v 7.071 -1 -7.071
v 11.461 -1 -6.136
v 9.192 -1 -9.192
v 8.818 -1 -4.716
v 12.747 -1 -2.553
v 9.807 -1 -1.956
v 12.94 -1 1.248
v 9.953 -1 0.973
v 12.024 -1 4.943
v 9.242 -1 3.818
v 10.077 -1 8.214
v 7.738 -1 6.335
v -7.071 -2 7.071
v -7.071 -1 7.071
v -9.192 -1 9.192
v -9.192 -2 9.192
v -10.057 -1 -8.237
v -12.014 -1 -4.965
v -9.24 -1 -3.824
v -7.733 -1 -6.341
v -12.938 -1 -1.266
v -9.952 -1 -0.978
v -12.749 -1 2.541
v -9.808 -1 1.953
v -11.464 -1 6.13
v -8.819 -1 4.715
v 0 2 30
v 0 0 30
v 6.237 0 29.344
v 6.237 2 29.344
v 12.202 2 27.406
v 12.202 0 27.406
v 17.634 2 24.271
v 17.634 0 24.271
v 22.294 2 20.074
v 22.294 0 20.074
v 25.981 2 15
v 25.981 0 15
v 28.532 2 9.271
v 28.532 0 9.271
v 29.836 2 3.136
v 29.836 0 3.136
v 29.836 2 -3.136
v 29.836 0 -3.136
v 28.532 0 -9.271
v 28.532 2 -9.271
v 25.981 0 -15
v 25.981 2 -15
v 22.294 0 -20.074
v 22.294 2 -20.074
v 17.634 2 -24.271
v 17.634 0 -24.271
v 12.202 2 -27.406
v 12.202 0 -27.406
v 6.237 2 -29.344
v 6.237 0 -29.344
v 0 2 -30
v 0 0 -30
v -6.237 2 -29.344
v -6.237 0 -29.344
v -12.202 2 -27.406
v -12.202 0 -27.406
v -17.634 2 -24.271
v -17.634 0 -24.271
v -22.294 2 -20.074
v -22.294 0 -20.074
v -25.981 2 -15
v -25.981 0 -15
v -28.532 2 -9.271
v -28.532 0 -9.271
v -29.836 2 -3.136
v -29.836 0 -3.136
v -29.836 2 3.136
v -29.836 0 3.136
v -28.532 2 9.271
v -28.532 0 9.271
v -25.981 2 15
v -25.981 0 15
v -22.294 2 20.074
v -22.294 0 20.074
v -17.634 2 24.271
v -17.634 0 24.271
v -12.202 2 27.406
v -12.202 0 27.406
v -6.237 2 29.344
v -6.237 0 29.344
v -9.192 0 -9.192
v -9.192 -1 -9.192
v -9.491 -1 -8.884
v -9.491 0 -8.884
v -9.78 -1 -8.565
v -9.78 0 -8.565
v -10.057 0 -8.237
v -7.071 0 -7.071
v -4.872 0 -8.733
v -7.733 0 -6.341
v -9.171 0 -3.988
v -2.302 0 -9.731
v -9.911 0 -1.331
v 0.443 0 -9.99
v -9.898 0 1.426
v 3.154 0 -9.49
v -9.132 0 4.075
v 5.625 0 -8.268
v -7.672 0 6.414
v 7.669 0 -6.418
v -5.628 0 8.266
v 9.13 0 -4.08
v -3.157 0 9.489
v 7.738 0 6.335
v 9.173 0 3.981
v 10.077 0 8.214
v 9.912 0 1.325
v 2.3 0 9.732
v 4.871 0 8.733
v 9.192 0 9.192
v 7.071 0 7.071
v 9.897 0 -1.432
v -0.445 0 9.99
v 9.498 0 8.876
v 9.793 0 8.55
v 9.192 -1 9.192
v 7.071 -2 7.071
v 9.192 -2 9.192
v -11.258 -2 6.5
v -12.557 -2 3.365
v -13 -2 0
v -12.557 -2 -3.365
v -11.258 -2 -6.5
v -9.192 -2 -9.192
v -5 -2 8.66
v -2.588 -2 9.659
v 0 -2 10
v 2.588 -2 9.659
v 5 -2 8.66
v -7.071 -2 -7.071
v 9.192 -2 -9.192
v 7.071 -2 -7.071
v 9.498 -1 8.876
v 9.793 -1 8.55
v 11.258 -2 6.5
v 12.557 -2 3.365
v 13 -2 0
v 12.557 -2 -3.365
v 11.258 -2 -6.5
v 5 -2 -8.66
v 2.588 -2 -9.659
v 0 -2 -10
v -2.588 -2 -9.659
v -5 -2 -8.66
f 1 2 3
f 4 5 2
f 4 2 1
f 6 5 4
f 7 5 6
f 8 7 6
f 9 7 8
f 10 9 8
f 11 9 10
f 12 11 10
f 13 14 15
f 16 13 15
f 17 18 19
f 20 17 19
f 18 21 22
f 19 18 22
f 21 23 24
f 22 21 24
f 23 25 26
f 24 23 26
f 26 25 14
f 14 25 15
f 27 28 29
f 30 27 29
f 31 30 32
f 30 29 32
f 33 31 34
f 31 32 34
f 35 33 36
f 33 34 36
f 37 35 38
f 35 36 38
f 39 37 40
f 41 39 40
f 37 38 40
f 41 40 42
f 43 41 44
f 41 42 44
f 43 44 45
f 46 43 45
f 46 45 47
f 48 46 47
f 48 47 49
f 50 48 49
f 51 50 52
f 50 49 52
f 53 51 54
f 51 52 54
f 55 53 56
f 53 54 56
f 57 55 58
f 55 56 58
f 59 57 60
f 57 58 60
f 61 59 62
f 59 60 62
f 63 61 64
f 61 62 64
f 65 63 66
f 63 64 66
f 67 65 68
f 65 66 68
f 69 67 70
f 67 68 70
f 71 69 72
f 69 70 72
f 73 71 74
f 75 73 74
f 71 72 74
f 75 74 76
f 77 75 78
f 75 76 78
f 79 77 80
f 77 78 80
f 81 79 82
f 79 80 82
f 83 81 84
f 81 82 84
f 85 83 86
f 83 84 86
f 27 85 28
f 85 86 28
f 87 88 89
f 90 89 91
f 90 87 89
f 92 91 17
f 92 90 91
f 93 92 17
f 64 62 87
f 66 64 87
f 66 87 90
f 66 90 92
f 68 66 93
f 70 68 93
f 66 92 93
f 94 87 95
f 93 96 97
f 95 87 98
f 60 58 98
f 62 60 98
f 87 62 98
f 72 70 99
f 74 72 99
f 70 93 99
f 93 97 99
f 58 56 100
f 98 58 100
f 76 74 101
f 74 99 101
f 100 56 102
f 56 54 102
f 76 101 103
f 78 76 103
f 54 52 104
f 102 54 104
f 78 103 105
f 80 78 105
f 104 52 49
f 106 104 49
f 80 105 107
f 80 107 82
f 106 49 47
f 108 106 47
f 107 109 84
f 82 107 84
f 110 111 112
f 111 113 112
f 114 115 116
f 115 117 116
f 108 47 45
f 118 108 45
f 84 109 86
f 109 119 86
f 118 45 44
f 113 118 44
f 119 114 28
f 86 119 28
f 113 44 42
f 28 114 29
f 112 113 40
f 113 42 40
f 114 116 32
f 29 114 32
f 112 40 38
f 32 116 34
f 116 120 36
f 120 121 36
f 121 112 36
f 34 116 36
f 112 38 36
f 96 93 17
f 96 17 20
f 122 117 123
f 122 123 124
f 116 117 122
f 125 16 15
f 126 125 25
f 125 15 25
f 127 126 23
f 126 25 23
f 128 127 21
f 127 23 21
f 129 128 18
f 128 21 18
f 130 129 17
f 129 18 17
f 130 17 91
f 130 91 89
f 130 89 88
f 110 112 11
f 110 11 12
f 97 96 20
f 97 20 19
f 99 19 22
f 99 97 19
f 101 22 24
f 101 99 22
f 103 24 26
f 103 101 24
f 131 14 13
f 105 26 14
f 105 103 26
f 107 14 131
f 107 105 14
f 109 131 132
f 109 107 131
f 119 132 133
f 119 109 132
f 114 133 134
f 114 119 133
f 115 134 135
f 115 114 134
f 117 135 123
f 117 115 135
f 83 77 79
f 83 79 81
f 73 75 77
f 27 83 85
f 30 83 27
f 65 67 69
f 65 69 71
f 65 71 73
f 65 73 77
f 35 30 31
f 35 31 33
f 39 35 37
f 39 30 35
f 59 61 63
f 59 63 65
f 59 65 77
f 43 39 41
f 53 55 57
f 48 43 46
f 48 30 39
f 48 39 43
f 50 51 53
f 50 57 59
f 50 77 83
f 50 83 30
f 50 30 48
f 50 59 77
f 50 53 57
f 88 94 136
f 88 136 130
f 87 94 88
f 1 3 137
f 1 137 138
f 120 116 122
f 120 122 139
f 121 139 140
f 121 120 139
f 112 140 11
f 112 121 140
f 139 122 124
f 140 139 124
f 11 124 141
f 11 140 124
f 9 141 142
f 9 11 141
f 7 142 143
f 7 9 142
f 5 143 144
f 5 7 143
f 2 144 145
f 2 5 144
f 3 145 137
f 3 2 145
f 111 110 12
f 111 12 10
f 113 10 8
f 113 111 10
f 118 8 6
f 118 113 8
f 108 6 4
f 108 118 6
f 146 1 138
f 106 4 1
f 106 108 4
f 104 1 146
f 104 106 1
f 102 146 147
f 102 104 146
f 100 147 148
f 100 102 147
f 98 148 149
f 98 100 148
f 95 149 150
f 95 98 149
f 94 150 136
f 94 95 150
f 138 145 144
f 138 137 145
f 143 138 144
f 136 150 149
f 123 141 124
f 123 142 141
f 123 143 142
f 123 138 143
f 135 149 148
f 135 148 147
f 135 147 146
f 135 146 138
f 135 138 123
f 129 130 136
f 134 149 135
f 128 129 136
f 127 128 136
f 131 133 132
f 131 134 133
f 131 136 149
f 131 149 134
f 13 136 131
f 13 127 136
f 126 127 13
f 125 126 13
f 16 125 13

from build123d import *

# Parameters (mm, degrees)
SKIZZE1_R                         = 10
AUFSATZ_LINEAR_AUSTRAGEN1_DEPTH   = 1
SKIZZE2_R                         = 30
AUFSATZ_LINEAR_AUSTRAGEN2_DEPTH   = 2
AUFSATZ_LINEAR_AUSTRAGEN3_DEPTH   = 1
AUFSATZ_LINEAR_AUSTRAGEN3_2_DEPTH = 1
SKIZZE4_R                         = 10
AUFSATZ_LINEAR_AUSTRAGEN4_DEPTH   = 1
AUFSATZ_LINEAR_START              = 3
AUFSATZ_LINEAR_AUSTRAGEN15_DEPTH  = 3


with BuildPart() as part:
    # Skizze1 → Aufsatz-Linear austragen1 (new body)
    with BuildSketch(Plane(origin=(0, 0, 0), x_dir=(1, 0, 0), z_dir=(0, 1, 0))):
        with Locations(Location((0, 0, 0), (0, 0, 270))):
            Circle(SKIZZE1_R)
    extrude(amount=-AUFSATZ_LINEAR_AUSTRAGEN1_DEPTH)

    # Skizze2 → Aufsatz-Linear austragen2 (add)
    with BuildSketch(Plane(origin=(0, 0, 0), x_dir=(1, 0, 0), z_dir=(0, 1, 0))):
        with Locations(Location((0, 0, 0), (0, 0, 270))):
            Circle(SKIZZE2_R)
    extrude(amount=AUFSATZ_LINEAR_AUSTRAGEN2_DEPTH)



with BuildPart() as body_2:
    # Skizze3 → Aufsatz-Linear austragen3 (new body)
    with BuildSketch(Plane.XZ.offset(1)):
        with BuildLine():
            Line((-7.071067812, 7.071067812), (-9.192388155, 9.192388155))
            ThreePointArc((-9.192388155, 9.192388155), (-13, 0), (-9.192388155, -9.192388155))
            Line((-9.192388155, -9.192388155), (-7.071067812, -7.071067812))
            ThreePointArc((-7.071067812, -7.071067812), (-10, 0), (-7.071067812, 7.071067812))
        make_face()
    extrude(amount=AUFSATZ_LINEAR_AUSTRAGEN3_DEPTH)


with BuildPart() as body_3:
    # Skizze3 → Aufsatz-Linear austragen3 2 (new body)
    with BuildSketch(Plane.XZ.offset(1)):
        with BuildLine():
            Line((7.071067812, 7.071067812), (9.192388155, 9.192388155))
            ThreePointArc((9.192388155, 9.192388155), (13, 0), (9.192388155, -9.192388155))
            Line((9.192388155, -9.192388155), (7.071067812, -7.071067812))
            ThreePointArc((7.071067812, -7.071067812), (10, 0), (7.071067812, 7.071067812))
        make_face()
    extrude(amount=AUFSATZ_LINEAR_AUSTRAGEN3_2_DEPTH)


with BuildPart() as part_1:
    add(part.part)

    add(body_2.part)  # Aufsatz-Linear austragen4 merges body 2

    add(body_3.part)  # Aufsatz-Linear austragen4 merges body 3
    # Skizze4 → Aufsatz-Linear austragen4 (add)
    with BuildSketch(Plane.XZ.offset(1)):
        with Locations(Location((0, 0, 0), (0, 0, 90))):
            Circle(SKIZZE4_R)
    extrude(amount=AUFSATZ_LINEAR_AUSTRAGEN4_DEPTH)

    # Skizze8 → Aufsatz-Linear austragen15 (add)
    with BuildSketch(Plane(origin=(0, -1, 0), x_dir=(1, 0, 0), z_dir=(0, 1, 0)).offset(AUFSATZ_LINEAR_START)):
        with BuildLine():
            Line((10.076521944, -8.213629254), (7.737557516, -6.334840462))
            ThreePointArc((7.737557516, -6.334840462), (7.413457608, -6.711232845), (7.071067812, -7.071067812))
            Line((7.071067812, -7.071067812), (9.192388155, -9.192388155))
            ThreePointArc((9.192388155, -9.192388155), (9.646875989, -8.714228804), (10.076521944, -8.213629254))
        make_face()
        with BuildLine():
            Line((-7.071067812, 7.071067812), (-9.192388155, 9.192388155))
            ThreePointArc((-9.192388155, 9.192388155), (-9.636776415, 8.725396284), (-10.057468336, 8.236949111))
            Line((-10.057468336, 8.236949111), (-7.732766819, 6.340687449))
            ThreePointArc((-7.732766819, 6.340687449), (-7.410920578, 6.714034271), (-7.071067812, 7.071067812))
        make_face()
    extrude(amount=-AUFSATZ_LINEAR_AUSTRAGEN15_DEPTH)


solid = part_1.part
